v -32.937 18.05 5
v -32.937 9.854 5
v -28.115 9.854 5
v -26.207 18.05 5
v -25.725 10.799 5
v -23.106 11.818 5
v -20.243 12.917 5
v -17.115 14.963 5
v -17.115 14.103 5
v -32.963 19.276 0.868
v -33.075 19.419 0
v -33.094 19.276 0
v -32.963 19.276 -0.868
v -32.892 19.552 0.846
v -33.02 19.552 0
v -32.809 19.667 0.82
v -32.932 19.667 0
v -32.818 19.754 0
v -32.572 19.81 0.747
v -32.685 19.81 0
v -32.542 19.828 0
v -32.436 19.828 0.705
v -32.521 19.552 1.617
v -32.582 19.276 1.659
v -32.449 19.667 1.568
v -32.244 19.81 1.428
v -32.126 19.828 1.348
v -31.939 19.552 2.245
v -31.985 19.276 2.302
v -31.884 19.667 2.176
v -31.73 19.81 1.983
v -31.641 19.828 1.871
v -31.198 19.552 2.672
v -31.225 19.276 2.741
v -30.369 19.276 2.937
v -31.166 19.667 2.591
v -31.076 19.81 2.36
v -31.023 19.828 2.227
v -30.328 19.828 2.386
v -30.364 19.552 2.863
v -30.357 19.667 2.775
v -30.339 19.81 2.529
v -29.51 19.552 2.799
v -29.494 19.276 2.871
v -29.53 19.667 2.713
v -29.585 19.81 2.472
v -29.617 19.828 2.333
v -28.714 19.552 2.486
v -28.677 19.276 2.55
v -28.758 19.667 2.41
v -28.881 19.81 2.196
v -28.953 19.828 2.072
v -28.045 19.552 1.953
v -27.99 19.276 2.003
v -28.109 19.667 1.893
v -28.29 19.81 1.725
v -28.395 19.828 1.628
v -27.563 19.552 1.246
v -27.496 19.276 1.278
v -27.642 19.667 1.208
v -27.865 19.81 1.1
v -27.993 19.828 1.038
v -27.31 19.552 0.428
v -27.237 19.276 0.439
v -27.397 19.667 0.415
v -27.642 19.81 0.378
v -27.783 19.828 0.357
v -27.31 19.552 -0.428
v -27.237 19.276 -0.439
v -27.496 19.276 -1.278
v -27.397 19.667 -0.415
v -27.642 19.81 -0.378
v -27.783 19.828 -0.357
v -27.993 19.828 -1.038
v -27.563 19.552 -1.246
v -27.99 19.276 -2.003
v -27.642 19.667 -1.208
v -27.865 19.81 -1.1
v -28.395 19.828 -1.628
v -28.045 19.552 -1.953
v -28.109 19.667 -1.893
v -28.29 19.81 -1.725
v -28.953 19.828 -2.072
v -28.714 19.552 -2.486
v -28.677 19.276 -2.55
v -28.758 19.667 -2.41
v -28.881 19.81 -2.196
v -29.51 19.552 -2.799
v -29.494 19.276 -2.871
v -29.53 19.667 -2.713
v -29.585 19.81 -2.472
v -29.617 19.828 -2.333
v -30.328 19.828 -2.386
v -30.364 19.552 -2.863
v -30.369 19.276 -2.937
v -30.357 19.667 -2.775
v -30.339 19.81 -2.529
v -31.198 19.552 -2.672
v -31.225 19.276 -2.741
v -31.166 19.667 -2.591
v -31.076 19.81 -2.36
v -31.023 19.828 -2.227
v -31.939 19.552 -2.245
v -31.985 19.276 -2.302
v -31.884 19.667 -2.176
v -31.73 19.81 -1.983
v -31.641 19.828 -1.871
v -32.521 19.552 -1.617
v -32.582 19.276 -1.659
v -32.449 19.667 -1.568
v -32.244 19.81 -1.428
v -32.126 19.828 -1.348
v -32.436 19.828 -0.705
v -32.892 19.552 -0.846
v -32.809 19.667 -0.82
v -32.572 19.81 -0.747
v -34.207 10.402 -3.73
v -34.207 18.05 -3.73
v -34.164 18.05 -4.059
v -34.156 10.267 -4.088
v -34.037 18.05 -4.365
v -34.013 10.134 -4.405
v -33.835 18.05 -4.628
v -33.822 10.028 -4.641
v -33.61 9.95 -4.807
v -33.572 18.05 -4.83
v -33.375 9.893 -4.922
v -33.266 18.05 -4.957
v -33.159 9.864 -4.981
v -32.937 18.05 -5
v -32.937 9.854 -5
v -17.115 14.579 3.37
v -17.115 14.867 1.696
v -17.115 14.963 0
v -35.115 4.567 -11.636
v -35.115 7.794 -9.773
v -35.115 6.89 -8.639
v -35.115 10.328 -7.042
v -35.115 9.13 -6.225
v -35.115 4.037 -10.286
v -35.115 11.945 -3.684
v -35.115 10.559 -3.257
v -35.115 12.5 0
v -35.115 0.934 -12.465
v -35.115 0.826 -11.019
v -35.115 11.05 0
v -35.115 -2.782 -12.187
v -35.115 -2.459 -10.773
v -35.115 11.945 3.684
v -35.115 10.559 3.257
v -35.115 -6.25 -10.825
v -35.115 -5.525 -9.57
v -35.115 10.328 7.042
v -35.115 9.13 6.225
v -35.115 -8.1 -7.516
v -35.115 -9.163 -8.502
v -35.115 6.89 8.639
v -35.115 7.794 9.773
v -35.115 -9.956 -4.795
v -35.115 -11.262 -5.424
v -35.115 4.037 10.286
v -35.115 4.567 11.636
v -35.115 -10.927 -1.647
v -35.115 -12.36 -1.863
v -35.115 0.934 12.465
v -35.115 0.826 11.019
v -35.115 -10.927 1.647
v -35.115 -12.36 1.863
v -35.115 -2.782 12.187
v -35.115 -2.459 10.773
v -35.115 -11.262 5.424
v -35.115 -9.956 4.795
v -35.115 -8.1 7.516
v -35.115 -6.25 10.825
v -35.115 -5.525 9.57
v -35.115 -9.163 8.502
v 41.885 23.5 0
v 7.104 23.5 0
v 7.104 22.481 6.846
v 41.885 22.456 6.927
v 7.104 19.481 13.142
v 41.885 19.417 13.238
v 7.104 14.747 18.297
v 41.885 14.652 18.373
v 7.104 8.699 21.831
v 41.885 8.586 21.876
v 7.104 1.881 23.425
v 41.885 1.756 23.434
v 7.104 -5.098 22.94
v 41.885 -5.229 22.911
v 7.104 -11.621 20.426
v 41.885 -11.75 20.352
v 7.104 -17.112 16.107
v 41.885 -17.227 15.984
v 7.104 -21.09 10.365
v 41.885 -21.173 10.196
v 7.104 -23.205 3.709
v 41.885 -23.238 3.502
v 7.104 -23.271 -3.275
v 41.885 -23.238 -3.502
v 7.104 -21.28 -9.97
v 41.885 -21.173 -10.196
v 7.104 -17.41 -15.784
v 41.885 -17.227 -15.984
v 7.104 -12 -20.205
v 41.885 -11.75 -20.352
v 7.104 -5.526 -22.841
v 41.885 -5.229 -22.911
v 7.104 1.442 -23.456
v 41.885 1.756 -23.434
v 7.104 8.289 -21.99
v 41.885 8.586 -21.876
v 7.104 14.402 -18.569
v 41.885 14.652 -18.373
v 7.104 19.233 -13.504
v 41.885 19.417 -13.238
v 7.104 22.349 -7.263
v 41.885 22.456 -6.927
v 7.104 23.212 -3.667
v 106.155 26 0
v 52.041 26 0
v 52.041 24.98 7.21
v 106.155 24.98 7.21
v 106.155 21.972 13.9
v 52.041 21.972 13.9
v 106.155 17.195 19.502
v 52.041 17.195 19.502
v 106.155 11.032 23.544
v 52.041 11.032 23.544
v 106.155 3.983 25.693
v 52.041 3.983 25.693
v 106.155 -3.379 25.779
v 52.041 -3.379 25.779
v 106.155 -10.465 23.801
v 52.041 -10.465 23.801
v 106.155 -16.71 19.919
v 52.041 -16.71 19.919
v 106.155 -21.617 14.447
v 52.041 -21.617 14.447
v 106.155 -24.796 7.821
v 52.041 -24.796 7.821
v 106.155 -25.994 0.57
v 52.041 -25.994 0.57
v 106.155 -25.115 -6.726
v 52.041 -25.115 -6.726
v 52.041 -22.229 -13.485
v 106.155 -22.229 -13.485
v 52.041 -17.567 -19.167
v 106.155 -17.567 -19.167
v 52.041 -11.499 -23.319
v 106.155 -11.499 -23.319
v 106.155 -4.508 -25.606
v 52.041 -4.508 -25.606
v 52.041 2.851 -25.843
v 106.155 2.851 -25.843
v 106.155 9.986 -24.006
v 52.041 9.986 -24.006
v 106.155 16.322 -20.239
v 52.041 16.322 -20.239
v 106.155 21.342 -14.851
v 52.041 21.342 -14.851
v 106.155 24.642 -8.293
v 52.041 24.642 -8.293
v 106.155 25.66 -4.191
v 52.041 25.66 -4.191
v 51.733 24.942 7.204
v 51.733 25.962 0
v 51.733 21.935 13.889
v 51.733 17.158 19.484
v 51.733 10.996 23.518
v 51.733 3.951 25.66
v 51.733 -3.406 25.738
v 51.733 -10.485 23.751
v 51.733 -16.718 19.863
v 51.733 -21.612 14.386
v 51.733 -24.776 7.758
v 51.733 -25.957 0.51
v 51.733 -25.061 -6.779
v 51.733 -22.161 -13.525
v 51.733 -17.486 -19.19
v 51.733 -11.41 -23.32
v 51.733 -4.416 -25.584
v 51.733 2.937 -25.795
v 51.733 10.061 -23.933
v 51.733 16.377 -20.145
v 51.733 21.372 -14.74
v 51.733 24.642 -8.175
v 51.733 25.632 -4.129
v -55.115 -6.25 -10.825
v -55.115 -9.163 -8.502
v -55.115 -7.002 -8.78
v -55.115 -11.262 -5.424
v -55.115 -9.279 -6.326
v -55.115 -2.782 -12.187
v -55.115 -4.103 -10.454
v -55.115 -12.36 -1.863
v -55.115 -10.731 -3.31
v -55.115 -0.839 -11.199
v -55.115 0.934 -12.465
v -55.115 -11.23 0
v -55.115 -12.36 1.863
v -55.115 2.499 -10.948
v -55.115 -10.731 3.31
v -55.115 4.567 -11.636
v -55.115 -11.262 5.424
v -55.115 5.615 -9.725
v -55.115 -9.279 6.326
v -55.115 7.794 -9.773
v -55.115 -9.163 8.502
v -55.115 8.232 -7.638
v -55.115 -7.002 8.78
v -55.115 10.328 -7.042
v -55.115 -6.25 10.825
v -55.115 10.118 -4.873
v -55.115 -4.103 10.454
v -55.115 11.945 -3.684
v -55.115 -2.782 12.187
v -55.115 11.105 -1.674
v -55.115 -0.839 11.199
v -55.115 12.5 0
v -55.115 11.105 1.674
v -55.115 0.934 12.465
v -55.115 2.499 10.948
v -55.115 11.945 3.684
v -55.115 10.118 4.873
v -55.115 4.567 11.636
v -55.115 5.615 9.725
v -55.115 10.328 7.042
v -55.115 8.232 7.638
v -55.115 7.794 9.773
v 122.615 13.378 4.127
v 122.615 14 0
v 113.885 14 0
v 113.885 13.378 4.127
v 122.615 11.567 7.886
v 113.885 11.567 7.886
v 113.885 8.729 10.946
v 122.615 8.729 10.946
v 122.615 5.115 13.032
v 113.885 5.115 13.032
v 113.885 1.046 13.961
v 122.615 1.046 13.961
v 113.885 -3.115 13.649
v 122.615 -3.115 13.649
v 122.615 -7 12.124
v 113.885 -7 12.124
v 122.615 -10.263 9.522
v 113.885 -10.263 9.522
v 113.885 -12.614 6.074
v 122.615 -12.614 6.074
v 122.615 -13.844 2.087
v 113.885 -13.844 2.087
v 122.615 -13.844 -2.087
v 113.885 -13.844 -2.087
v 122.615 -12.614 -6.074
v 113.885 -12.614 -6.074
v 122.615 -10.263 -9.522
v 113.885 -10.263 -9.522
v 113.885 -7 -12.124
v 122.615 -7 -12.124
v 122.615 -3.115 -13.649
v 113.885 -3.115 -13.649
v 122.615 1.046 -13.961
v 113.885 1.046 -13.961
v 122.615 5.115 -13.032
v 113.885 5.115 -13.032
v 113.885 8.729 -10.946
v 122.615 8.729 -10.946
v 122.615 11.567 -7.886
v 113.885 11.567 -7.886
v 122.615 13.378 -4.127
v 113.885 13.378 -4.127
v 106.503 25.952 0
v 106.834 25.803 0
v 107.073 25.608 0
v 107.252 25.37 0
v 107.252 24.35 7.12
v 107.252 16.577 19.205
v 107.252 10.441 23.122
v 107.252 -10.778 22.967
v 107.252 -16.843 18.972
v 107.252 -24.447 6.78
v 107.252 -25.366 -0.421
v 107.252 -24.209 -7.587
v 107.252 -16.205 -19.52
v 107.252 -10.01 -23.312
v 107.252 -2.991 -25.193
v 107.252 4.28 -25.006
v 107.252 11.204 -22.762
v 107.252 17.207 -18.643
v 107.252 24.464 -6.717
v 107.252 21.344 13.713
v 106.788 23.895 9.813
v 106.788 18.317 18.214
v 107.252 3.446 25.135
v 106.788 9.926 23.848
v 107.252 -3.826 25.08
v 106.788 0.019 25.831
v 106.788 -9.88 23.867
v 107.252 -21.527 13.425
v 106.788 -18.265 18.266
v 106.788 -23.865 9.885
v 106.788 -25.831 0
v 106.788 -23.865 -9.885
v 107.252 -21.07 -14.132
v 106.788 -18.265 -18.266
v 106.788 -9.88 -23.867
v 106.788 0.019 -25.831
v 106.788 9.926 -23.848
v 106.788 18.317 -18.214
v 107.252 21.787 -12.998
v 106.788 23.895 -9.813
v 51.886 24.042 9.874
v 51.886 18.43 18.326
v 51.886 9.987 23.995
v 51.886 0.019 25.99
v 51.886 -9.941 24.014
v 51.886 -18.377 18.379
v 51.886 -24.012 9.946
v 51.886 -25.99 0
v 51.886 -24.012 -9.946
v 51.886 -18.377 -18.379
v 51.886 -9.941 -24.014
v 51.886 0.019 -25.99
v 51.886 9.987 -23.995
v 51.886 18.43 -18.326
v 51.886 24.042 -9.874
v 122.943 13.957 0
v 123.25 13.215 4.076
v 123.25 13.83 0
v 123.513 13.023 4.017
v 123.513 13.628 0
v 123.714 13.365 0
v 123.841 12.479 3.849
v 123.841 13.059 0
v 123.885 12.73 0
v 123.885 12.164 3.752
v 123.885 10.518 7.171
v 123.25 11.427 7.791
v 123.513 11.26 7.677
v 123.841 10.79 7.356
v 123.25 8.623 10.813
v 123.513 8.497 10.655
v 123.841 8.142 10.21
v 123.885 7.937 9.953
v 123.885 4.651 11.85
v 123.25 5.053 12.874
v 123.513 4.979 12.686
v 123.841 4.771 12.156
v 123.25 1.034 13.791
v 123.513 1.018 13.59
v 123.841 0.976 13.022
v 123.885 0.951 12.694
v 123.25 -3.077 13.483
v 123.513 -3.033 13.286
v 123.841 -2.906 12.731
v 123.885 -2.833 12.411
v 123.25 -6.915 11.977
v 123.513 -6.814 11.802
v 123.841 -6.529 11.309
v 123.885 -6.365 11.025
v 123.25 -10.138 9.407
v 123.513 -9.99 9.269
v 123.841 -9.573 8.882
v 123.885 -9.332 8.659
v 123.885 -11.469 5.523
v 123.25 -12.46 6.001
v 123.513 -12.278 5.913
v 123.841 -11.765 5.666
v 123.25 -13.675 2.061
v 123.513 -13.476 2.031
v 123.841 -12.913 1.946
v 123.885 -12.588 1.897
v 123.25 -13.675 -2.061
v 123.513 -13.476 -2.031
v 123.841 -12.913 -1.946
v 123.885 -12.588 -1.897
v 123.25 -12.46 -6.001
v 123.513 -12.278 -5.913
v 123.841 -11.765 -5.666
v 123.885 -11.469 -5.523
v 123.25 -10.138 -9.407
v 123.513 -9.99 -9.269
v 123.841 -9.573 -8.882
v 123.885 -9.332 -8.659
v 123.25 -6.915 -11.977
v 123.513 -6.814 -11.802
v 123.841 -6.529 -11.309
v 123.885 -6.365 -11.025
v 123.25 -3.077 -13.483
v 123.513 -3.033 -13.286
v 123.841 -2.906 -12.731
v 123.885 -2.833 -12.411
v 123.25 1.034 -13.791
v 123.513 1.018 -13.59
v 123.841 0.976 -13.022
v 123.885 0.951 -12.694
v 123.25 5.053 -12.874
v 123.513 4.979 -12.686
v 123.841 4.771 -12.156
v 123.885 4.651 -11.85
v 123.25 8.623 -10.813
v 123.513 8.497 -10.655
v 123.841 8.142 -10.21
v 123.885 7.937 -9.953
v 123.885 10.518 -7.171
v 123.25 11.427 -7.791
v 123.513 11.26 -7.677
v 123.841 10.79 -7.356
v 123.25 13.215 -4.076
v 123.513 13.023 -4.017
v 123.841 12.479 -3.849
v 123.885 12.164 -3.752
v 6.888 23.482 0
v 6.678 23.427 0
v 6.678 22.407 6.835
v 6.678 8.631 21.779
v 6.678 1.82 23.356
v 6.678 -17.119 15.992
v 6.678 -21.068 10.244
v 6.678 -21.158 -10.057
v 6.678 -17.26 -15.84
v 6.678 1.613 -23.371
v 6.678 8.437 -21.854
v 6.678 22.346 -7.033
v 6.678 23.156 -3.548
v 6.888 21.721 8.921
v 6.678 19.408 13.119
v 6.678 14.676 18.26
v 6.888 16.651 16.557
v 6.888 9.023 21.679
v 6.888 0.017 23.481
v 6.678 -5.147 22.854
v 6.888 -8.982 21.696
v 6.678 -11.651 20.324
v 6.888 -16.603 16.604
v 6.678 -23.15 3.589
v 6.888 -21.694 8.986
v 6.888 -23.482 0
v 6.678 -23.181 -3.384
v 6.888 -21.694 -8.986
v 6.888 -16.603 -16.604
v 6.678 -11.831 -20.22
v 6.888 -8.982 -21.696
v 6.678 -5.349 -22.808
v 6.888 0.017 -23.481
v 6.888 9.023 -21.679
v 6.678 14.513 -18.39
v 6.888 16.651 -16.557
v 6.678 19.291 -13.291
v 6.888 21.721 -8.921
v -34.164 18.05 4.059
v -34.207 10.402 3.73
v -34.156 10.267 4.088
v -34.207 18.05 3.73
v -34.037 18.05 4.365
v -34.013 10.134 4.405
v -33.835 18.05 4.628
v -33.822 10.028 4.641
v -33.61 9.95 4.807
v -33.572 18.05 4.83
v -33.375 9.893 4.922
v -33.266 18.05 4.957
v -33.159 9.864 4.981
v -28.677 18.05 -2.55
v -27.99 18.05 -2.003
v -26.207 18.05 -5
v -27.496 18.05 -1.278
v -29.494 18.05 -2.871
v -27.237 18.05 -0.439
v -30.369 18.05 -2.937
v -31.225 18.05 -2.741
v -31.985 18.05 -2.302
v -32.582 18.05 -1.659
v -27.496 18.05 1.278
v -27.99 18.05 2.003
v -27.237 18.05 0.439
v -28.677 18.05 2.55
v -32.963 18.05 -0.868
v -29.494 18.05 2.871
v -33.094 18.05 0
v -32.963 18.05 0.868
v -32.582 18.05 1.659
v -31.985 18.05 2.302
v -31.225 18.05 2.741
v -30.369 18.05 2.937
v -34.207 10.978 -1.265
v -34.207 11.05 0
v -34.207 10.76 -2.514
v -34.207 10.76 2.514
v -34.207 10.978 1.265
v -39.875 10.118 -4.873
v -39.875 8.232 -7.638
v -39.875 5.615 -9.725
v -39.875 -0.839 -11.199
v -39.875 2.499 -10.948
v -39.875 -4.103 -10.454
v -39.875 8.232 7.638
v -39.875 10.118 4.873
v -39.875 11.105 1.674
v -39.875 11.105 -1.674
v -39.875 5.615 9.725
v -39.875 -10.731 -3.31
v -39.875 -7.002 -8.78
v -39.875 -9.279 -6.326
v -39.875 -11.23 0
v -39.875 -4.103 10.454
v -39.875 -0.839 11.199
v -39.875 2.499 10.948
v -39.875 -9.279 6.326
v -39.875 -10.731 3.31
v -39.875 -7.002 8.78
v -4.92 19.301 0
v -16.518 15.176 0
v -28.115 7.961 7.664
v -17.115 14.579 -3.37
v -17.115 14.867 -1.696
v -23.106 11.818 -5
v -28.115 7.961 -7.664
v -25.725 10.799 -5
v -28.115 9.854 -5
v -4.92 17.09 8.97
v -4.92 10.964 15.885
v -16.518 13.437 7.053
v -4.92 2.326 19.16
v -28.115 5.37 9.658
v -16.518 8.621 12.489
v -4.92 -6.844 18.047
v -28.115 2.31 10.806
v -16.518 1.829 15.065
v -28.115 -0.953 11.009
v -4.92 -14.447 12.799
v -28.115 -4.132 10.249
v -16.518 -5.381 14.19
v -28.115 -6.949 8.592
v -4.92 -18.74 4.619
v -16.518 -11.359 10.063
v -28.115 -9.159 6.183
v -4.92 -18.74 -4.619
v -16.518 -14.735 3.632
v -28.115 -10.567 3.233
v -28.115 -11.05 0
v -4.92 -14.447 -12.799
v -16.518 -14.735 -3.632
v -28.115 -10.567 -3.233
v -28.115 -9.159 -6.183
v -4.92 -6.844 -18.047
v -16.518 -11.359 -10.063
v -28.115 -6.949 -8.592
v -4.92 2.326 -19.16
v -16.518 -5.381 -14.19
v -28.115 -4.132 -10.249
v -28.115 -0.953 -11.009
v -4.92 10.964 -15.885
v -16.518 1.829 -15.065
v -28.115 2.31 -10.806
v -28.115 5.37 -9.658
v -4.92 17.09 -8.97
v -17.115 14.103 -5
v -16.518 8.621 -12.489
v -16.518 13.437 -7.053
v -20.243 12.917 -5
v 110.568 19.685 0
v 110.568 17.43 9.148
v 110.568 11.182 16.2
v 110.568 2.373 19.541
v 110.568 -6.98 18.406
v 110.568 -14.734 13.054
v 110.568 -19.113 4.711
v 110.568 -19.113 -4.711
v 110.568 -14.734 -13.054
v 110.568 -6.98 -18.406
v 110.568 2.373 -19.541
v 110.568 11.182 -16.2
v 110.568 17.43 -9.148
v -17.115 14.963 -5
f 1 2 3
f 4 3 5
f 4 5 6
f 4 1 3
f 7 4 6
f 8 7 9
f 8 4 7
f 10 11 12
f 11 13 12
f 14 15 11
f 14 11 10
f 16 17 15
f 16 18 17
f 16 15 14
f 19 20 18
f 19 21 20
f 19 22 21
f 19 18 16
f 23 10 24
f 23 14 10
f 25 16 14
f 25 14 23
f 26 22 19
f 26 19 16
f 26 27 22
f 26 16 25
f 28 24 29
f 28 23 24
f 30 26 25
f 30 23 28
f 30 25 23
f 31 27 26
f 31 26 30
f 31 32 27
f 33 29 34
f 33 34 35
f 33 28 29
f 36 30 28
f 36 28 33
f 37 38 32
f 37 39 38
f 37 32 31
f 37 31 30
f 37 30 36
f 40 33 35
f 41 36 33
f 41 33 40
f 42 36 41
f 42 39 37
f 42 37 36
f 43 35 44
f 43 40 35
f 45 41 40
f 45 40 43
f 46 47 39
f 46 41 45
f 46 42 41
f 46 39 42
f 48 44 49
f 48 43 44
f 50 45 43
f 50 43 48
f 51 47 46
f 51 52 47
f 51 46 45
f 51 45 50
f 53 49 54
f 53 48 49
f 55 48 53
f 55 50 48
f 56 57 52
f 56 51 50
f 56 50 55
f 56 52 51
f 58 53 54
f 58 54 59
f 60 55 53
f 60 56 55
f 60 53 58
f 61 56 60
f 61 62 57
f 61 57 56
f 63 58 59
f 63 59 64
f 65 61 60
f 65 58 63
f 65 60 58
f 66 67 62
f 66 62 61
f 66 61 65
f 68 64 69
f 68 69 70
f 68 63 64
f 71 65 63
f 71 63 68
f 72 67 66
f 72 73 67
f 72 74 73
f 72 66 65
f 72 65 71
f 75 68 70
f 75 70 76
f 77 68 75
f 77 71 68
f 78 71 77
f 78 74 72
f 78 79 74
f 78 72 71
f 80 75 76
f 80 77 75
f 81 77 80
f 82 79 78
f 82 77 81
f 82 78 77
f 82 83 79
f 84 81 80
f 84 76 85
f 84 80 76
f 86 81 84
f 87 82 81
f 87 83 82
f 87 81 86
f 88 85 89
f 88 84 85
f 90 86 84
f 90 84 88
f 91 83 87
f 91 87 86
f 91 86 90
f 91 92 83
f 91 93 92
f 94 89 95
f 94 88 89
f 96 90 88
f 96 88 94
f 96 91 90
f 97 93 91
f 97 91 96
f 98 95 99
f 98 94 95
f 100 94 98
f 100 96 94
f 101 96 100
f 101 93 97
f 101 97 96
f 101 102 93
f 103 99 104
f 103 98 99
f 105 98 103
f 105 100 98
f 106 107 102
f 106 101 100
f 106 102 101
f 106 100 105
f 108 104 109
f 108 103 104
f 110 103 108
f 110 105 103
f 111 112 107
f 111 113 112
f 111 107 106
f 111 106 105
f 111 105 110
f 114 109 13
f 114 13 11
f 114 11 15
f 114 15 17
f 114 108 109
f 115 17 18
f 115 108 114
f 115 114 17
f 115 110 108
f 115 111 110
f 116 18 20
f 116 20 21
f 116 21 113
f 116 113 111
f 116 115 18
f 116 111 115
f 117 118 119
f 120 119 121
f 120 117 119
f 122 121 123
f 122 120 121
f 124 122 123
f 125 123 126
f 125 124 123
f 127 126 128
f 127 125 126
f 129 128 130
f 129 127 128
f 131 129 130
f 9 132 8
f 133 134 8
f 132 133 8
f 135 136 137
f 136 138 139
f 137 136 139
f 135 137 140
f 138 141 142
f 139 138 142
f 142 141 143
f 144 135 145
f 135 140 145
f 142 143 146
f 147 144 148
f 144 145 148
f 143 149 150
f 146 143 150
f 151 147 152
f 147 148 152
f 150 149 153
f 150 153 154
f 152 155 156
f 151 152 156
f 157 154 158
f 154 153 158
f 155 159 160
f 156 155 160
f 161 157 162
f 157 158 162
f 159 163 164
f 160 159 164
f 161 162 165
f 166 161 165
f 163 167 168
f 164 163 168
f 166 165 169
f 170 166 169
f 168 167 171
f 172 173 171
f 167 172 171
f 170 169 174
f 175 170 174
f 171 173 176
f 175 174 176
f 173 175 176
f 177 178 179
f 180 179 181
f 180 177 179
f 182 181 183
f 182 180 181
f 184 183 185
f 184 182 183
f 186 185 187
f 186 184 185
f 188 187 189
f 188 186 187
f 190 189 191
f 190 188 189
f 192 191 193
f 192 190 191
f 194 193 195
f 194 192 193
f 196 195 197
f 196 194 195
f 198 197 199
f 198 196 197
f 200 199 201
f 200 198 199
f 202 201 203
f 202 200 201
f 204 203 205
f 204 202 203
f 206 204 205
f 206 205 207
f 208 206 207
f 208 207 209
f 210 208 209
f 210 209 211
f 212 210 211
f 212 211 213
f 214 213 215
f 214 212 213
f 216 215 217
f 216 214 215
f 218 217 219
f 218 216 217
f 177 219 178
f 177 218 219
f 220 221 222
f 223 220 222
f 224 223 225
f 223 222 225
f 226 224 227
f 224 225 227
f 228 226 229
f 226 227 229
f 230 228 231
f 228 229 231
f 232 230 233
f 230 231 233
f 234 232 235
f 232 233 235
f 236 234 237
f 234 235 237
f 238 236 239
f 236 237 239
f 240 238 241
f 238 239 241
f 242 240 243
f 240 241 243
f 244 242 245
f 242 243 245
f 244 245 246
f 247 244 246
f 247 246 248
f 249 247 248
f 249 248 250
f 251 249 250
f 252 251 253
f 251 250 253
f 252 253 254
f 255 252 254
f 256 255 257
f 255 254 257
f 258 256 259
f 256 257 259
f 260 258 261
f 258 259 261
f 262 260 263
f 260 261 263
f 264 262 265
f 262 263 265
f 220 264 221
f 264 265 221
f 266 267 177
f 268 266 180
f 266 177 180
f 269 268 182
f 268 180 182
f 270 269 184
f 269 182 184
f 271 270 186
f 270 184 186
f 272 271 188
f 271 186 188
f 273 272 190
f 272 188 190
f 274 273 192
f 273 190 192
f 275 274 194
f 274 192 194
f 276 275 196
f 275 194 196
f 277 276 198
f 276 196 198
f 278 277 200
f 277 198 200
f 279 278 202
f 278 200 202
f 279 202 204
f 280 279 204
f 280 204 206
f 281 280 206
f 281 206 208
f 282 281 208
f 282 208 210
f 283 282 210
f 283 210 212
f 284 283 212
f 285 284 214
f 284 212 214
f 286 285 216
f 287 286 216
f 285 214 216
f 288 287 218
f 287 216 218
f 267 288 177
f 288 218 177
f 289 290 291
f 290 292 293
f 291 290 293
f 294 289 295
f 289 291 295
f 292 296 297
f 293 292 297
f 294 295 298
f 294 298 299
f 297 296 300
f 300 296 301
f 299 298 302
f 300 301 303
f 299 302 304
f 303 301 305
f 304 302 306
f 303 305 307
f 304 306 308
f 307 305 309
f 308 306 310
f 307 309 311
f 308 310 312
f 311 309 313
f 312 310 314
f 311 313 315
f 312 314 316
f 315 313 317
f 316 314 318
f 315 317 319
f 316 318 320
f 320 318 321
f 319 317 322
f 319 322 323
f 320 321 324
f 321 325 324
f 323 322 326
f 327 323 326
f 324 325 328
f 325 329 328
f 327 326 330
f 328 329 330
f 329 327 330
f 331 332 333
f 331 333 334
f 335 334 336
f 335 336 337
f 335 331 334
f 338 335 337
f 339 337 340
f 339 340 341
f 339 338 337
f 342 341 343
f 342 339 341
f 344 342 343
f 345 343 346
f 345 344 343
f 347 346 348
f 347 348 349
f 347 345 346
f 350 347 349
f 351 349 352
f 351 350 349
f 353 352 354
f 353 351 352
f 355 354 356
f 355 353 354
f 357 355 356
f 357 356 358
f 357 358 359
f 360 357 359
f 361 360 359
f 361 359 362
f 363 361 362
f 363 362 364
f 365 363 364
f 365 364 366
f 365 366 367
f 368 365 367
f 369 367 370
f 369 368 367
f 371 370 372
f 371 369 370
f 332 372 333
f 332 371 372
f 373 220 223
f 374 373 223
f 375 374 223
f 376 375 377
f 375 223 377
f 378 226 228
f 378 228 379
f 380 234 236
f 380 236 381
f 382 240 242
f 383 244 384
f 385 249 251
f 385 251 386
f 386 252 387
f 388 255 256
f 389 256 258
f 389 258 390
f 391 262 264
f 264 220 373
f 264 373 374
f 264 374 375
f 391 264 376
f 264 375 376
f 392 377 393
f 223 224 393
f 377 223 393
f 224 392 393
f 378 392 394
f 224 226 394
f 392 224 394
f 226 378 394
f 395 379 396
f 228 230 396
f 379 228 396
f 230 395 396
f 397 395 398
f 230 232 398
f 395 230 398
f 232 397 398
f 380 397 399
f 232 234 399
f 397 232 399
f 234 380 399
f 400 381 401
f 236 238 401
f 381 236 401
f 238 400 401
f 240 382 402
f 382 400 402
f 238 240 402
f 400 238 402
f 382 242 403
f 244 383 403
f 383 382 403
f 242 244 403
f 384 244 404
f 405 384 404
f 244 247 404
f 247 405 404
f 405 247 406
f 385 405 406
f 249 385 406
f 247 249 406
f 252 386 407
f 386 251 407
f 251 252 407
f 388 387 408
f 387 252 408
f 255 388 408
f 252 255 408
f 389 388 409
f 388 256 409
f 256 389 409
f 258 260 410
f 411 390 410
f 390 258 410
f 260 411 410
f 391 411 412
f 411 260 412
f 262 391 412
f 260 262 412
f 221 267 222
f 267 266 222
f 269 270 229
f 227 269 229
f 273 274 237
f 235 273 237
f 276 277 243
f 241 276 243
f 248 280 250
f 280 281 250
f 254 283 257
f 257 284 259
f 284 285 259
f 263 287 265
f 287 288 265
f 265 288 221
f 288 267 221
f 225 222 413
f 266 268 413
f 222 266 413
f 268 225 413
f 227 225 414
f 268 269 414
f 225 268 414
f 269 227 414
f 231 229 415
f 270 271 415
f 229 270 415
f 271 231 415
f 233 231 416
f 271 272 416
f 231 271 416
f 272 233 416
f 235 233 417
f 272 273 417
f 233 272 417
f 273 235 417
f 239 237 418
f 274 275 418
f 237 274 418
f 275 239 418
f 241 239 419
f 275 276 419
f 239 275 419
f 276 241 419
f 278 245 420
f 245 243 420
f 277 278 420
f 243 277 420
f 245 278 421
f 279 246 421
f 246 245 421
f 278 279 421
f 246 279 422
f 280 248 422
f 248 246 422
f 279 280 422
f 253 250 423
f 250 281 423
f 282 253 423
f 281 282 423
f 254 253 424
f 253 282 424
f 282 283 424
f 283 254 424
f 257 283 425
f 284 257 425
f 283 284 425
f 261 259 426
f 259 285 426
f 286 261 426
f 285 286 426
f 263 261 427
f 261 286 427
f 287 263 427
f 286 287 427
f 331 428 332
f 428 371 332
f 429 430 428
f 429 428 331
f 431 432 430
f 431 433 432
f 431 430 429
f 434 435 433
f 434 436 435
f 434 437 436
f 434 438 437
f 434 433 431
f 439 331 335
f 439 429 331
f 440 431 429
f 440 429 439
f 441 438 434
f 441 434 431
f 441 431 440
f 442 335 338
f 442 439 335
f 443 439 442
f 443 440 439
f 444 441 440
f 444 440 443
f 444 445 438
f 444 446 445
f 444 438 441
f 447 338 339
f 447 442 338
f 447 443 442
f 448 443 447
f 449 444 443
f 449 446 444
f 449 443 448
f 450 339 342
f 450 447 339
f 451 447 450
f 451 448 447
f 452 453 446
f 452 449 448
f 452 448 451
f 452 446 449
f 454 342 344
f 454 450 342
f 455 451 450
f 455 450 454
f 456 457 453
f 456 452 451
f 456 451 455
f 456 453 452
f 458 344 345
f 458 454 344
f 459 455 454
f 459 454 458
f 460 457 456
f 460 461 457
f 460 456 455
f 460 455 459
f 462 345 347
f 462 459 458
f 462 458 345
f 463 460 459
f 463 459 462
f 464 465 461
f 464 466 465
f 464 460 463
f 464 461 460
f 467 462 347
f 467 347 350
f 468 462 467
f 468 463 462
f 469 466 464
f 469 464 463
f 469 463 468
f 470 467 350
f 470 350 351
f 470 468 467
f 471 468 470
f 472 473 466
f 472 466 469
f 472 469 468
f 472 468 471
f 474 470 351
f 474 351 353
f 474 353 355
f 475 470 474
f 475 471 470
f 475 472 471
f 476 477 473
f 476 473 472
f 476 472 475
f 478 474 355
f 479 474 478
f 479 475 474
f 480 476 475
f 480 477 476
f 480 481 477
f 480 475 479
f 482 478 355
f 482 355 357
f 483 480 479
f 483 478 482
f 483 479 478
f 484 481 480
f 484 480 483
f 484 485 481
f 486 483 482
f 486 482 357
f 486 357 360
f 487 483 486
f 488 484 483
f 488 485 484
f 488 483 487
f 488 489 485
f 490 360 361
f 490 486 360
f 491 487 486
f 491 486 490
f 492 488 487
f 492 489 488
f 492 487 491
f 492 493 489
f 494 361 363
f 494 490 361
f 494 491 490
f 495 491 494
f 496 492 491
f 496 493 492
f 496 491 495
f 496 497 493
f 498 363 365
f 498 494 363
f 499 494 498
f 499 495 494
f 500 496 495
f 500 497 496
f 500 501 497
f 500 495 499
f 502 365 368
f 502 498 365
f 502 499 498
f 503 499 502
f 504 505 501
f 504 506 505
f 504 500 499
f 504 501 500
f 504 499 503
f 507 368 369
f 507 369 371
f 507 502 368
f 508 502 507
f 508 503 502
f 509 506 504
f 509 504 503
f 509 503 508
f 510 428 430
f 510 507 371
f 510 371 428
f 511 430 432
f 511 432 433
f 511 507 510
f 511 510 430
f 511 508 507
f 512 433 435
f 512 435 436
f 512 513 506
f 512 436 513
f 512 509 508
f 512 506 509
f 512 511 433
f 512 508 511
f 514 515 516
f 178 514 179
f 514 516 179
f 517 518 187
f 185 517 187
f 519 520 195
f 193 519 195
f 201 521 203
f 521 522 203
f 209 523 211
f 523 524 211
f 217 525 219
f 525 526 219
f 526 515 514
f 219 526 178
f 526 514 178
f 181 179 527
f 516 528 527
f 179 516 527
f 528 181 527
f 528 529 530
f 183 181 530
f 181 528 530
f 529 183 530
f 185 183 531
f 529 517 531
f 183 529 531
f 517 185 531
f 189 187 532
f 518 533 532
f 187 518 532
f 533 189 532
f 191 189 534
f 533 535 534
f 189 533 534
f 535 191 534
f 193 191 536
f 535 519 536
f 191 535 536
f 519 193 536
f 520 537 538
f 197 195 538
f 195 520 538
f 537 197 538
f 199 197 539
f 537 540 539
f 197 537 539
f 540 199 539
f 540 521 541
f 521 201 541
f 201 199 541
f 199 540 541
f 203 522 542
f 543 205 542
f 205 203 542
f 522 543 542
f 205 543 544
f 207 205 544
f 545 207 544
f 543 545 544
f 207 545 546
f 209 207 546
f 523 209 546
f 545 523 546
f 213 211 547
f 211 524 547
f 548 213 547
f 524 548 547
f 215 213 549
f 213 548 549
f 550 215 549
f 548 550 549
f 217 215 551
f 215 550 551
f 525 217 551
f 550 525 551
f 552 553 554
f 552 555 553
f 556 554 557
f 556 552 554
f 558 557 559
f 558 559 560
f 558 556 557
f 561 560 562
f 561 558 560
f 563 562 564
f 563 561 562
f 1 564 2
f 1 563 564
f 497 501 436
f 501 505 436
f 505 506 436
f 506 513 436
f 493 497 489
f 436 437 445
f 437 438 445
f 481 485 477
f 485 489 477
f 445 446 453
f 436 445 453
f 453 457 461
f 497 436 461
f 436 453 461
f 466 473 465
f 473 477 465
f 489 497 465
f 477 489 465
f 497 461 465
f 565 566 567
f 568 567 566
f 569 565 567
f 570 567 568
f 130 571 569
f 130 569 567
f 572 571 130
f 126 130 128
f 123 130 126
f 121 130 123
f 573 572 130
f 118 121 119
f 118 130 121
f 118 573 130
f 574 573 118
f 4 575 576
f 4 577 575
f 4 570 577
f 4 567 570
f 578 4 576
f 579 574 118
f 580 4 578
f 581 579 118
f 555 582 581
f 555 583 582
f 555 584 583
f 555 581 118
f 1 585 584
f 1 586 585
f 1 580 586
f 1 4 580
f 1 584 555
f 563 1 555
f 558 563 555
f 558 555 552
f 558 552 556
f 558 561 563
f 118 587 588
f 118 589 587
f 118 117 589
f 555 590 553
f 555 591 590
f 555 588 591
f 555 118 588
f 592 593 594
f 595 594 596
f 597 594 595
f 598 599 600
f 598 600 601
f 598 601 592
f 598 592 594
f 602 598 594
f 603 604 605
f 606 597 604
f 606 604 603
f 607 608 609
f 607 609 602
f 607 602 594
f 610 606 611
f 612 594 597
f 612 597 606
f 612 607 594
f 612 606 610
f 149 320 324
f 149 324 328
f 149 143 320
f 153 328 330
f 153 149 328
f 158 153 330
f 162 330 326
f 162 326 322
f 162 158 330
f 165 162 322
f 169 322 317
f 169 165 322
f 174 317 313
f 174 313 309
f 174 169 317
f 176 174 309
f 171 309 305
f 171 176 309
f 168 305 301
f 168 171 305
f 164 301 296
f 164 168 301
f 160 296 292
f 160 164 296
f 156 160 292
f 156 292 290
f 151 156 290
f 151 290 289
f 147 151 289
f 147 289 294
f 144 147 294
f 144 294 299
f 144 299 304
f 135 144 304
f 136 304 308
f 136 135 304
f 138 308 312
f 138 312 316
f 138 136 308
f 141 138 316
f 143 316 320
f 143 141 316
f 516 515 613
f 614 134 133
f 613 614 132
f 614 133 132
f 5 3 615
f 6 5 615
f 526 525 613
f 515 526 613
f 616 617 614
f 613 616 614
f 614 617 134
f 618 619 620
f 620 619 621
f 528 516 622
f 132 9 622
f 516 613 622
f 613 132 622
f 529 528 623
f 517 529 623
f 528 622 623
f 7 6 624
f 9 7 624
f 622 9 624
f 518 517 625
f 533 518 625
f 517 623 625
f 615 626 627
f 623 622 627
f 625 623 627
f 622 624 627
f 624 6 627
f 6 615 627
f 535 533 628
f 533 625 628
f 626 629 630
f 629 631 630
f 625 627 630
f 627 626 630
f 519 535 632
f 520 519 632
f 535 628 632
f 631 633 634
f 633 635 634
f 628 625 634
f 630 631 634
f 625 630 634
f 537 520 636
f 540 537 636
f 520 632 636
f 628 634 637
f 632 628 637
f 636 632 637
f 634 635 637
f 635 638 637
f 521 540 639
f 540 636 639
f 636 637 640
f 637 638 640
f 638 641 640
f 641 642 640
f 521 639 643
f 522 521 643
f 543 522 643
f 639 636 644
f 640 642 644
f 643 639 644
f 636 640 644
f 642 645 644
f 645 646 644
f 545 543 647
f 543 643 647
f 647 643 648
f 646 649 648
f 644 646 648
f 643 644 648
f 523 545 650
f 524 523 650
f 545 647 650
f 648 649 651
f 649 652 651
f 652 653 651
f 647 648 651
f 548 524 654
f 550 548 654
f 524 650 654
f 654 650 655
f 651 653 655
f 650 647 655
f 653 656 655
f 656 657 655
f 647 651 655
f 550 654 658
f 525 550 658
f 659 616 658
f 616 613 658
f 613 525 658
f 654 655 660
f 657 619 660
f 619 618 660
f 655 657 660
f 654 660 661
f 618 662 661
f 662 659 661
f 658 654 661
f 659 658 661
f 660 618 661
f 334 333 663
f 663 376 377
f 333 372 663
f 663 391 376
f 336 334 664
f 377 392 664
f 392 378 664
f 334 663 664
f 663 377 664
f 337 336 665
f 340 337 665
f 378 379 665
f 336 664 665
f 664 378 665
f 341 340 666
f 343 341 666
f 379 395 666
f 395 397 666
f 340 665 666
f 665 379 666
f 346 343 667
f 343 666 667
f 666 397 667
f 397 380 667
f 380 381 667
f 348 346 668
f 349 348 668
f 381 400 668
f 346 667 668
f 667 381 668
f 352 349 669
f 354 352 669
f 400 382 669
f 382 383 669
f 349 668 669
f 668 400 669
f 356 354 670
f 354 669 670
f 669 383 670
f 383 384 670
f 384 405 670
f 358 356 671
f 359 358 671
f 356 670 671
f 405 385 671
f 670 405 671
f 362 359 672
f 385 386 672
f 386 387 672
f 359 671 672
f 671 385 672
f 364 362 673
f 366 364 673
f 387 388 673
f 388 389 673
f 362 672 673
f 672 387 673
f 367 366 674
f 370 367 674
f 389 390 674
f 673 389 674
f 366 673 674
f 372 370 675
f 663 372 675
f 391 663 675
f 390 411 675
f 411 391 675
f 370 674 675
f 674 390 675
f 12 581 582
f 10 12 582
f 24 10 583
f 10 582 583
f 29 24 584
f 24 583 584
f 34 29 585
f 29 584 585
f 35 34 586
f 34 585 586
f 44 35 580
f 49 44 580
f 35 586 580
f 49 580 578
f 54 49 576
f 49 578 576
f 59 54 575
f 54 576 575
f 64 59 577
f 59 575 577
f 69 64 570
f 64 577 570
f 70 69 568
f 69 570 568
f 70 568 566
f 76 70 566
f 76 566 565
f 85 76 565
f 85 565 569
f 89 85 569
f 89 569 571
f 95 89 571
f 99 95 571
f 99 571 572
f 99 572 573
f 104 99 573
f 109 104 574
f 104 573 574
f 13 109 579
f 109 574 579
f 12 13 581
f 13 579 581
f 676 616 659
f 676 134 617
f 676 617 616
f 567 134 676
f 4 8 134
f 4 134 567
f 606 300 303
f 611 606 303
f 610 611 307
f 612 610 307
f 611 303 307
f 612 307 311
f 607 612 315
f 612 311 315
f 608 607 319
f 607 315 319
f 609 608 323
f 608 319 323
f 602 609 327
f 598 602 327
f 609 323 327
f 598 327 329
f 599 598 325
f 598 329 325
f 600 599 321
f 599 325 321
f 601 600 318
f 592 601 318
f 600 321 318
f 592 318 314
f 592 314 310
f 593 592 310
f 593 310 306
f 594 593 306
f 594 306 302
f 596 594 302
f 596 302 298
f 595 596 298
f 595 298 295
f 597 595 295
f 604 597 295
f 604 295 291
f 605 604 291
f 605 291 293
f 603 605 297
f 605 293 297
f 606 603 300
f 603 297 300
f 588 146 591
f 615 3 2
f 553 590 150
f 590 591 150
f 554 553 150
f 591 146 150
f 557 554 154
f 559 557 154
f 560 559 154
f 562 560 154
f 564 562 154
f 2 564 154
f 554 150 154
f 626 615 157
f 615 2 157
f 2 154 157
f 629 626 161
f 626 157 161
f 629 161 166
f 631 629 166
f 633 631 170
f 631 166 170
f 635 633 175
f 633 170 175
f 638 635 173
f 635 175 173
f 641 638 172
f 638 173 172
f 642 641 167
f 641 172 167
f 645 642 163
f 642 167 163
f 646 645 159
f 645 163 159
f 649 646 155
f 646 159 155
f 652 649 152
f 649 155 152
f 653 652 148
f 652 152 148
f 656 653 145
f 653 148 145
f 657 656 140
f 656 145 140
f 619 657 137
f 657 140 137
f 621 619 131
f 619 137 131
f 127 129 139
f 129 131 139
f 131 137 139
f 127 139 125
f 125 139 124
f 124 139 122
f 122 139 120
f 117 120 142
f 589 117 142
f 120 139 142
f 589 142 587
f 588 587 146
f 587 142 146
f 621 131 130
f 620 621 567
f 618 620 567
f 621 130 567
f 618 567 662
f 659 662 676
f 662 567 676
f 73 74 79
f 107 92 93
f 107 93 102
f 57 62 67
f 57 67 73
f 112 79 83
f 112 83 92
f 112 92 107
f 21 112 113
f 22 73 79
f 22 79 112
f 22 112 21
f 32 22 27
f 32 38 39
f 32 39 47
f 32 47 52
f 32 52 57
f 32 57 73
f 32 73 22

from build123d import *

# Parameters (mm, degrees)
F0_W     = 20
F0_H     = 11.0503323376
F0_H_2   = 1.4496676624
F0_W_2   = 35
F0_H_3   = 23.5
F0_W_3   = 10
F0_H_4   = 14
F2_DEPTH = 5
F3_DEPTH = 5
F4_DEPTH = 10
F6_R     = 1.27
F7_R     = 11.2300002947
F8_DEPTH = 15.24
F5_R     = 2.9447713958
F9_DEPTH = 1.778
F10_R    = 0.5518892204


with BuildPart() as f1:
    # F0 (on Top) → F1 (revolve)
    with BuildSketch(Plane.XY):
        with Locations((-45.1154029071, 5.5251661688)):
            Rectangle(F0_W, F0_H)
        with Locations((-45.1154029071, 11.7751661688)):
            Rectangle(F0_W, F0_H_2)
        Polygon((-35.1154029071, 11.0503323376), (-35.1154029071, 0), (-28.1154029071, 0), (-28.1154029071, 11.0503323376), (-34.2071130872, 11.0503323376), align=None)
        Polygon((-28.1154029071, 11.0503323376), (-28.1154029071, 0), (-17.1154029071, 0), (6.8845970929, 0), (6.8845970929, 23.5), (-17.1154029071, 14.9630850315), align=None)
        with Locations((24.3845970929, 11.75)):
            Rectangle(F0_W_2, F0_H_3)
        Polygon((41.8845970929, 23.5), (41.8845970929, 0), (51.8845970929, 0), (51.8845970929, 26), align=None)
        Polygon((51.8845970929, 26), (51.8845970929, 0), (106.8845970929, 0), (113.8845970929, 0), (113.8845970929, 14), (106.8845970929, 26), align=None)
        with Locations((118.8845970929, 7)):
            Rectangle(F0_W_3, F0_H_4)
    revolve(axis=Axis((34.3845970929, 0, 0), (1, 0, 0)))



with BuildPart() as f2:
    # F0 (on Top) → F2 (new body)
    with BuildSketch(Plane.XY):
        Polygon((-34.2071130872, 11.0503323376), (-28.1154029071, 11.0503323376), (-17.1154029071, 14.9630850315), (-26.2071130872, 18.0503323376), (-34.2071130872, 18.0503323376), align=None)
    extrude(amount=F2_DEPTH)


with BuildPart() as f1_1:
    add(f1.part)

    add(f2.part)  # F3 merges F2
    # F0 (on Top) → F3 (join)
    with BuildSketch(Plane.XY):
        Polygon((-34.2071130872, 11.0503323376), (-28.1154029071, 11.0503323376), (-17.1154029071, 14.9630850315), (-26.2071130872, 18.0503323376), (-34.2071130872, 18.0503323376), align=None)
    extrude(amount=-F3_DEPTH)

    # F4 (add): faces of the model
    f4_faces = [f1_1.faces().sort_by_distance(p)[0] for p in [
        (-31.1612579972, 11.0503323376, 2.5),
        (-31.1612579972, 11.0503323376, -2.5),
        (-22.6154029071, 13.0067086846, 2.5),
        (-22.6154029071, 13.0067086846, -2.5),
    ]]
    extrude(f4_faces, amount=F4_DEPTH, dir=(0, -1, 0))

    # F6
    f6_edges = [f1_1.edges().sort_by_distance(p)[0] for p in [
        (-34.207113, 13.952383, 5),
        (-34.207113, 13.952383, -5),
        (-34.661258, 11.050332, 0),
        (123.884597, -14, 0),
        (106.884597, -26, 0),
        (51.884597, -26, 0),
        (6.884597, -23.5, 0),
    ]]
    fillet(f6_edges, radius=F6_R)

    # F7 (on face) → F8 (cut)
    with BuildSketch(Plane(origin=(-55.1154029071, 0, 0), x_dir=(0, -1, 0), z_dir=(-1, 0, 0))):
        Circle(F7_R)
    extrude(amount=-F8_DEPTH, mode=Mode.SUBTRACT)

    # F5 (on face) → F9 (join)
    with BuildSketch(Plane(origin=(0, 18.0503323376, 0), x_dir=(-1, 0, 0), z_dir=(0, 1, 0))):
        with Locations((30.1491450518, 0)):
            Circle(F5_R)
    extrude(amount=F9_DEPTH)

    # F10
    f10_edges = [f1_1.edges().sort_by_distance(p)[0] for p in [
        (-27.204374, 19.828332, 0),
    ]]
    fillet(f10_edges, radius=F10_R)


solid = f1_1.part
